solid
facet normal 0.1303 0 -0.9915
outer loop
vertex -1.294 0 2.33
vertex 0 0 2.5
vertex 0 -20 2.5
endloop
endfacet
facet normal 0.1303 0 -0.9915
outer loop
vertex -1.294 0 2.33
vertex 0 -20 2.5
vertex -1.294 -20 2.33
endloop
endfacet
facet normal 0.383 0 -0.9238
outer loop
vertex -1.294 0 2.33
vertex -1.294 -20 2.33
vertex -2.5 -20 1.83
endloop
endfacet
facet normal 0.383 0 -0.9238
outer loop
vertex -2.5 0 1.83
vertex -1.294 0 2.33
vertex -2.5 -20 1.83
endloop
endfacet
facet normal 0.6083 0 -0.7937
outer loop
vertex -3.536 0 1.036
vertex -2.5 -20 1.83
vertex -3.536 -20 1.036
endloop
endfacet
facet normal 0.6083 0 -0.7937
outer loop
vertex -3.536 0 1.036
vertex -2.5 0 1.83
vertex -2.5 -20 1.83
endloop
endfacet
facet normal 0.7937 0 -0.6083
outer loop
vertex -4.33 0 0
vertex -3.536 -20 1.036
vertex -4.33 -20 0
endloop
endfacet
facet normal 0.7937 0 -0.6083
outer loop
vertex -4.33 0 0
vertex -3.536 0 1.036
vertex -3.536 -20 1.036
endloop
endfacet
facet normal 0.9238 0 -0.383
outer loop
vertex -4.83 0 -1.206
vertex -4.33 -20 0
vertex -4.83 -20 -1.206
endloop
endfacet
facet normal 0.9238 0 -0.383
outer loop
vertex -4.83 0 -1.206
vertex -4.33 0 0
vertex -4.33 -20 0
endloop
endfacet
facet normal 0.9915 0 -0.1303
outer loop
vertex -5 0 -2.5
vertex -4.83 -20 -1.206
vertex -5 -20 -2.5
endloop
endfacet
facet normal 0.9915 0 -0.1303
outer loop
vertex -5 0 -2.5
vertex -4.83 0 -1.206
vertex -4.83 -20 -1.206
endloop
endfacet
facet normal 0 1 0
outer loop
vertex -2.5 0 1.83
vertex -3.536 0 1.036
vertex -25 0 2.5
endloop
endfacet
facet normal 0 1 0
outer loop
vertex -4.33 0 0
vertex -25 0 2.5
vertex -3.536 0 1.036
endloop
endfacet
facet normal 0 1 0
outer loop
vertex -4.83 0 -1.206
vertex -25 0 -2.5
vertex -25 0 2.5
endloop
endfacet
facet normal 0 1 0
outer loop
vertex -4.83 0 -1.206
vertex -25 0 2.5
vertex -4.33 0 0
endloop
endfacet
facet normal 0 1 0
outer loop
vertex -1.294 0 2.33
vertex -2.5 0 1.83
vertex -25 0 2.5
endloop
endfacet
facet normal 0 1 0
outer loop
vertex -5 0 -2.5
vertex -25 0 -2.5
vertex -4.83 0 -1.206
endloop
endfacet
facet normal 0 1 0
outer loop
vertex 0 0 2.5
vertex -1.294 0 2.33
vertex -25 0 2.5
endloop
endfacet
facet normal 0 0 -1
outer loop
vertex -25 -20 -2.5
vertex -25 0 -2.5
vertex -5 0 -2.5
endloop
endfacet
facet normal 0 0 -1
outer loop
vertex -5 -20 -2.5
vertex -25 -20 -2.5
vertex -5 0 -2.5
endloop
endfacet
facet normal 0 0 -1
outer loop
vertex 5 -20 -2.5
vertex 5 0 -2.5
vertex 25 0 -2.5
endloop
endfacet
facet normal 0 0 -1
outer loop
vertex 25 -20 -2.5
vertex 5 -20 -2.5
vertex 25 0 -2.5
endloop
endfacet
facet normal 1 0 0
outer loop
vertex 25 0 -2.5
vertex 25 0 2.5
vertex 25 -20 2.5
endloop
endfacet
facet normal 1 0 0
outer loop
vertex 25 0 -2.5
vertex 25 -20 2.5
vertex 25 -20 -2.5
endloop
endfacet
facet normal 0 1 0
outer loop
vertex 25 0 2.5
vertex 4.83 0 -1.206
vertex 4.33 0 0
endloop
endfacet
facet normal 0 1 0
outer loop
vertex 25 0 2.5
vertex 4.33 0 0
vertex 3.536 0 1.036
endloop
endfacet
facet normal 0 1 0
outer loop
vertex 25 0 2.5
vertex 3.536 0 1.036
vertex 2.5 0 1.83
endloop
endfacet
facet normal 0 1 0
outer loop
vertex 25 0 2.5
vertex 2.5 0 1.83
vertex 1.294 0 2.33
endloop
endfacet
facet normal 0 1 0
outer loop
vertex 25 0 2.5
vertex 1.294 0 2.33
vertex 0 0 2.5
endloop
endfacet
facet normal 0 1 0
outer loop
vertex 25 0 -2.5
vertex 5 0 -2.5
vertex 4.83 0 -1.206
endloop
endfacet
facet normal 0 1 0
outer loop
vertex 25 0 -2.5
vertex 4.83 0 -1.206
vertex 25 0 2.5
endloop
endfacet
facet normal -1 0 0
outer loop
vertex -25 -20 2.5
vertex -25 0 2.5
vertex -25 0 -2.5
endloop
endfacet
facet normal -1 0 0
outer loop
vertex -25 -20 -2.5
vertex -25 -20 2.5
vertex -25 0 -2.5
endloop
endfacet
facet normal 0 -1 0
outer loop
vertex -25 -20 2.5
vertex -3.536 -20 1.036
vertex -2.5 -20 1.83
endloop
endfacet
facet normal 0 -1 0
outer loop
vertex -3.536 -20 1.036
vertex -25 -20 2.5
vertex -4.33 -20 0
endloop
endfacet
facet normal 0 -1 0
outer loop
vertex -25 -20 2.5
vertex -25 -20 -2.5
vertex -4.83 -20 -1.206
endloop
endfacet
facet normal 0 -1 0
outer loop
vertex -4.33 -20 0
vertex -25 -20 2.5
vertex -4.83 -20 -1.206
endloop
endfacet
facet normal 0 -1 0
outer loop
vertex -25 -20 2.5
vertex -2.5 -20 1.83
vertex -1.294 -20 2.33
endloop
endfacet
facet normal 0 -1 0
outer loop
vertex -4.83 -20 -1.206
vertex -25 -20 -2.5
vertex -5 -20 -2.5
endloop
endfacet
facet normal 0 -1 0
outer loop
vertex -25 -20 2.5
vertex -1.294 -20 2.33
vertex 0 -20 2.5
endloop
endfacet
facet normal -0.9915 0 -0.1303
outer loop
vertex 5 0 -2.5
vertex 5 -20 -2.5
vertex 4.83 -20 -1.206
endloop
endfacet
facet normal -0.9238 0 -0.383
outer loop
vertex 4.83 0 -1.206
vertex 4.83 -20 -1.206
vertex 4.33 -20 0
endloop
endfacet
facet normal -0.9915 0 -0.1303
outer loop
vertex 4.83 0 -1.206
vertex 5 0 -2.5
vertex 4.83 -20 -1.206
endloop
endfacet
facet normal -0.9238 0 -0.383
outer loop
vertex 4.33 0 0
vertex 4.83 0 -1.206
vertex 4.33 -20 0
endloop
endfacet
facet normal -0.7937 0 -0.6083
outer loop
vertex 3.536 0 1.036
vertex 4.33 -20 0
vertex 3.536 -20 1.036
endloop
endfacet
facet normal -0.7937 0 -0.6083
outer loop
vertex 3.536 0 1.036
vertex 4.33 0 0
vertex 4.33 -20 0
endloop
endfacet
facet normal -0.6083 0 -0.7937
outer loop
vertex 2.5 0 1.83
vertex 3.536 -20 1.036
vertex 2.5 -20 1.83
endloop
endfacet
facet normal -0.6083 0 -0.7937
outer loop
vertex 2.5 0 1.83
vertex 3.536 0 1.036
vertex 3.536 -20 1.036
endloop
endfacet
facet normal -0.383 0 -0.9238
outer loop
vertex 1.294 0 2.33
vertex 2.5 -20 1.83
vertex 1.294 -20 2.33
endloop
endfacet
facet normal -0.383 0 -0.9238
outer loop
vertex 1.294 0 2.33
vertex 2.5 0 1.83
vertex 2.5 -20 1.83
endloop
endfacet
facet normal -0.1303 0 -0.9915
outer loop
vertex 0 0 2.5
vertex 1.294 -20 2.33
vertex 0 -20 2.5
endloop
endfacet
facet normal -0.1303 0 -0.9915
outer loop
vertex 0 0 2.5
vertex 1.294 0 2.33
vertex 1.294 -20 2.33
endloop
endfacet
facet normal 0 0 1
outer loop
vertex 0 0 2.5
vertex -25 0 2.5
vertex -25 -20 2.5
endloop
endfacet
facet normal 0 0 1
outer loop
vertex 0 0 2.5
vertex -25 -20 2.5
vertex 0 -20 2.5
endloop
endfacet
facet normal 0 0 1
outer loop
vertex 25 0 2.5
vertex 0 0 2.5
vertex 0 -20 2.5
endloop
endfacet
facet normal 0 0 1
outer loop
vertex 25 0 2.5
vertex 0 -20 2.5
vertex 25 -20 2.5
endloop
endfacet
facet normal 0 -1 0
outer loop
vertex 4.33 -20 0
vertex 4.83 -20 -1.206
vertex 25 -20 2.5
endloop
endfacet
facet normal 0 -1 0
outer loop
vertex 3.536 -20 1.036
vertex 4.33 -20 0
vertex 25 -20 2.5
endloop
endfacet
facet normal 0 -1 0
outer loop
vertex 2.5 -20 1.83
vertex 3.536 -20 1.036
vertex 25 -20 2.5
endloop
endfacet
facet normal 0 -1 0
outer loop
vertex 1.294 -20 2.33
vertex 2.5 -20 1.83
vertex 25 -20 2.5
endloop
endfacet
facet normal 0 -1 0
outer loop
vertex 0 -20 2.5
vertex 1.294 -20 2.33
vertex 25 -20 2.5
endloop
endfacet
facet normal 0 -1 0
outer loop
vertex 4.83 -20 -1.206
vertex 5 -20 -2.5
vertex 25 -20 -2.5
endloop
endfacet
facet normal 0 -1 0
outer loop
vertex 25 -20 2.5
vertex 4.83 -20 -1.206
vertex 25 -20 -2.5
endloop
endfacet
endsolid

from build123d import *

# Parameters (mm, degrees)
SKETCH3_W           = 50
SKETCH3_H           = 5
BOSS_EXTRUDE2_DEPTH = 20
CUT_EXTRUDE2_DEPTH  = 20


with BuildPart() as part:
    # Sketch3 → Boss-Extrude2 (new body)
    with BuildSketch(Plane(origin=(0, 0, 0), x_dir=(1, 0, 0), z_dir=(0, 1, 0))):
        Rectangle(SKETCH3_W, SKETCH3_H)
    extrude(amount=-BOSS_EXTRUDE2_DEPTH)

    # Sketch5 → Cut-Extrude2 (cut)
    with BuildSketch(Plane(origin=(0, 0, 0), x_dir=(1, 0, 0), z_dir=(0, 1, 0))):
        with BuildLine():
            Line((-5, 2.5), (5, 2.5))
            ThreePointArc((5, 2.5), (0, -2.5), (-5, 2.5))
        make_face()
    extrude(amount=-CUT_EXTRUDE2_DEPTH, mode=Mode.SUBTRACT)


with BuildPart() as cut_extrude2_piece_1:
    # of the separate pieces the step leaves, piece 1, a body of its own (cut_extrude2_pieces)
    add(part.part.solids().sort_by_distance((5, 0, -2.5))[0])


with BuildPart() as cut_extrude2_piece_2:
    # of the separate pieces the step leaves, piece 2, a body of its own (cut_extrude2_pieces)
    add(part.part.solids().sort_by_distance((-25, 0, -2.5))[0])


solid = Compound([cut_extrude2_piece_1.part, cut_extrude2_piece_2.part])
